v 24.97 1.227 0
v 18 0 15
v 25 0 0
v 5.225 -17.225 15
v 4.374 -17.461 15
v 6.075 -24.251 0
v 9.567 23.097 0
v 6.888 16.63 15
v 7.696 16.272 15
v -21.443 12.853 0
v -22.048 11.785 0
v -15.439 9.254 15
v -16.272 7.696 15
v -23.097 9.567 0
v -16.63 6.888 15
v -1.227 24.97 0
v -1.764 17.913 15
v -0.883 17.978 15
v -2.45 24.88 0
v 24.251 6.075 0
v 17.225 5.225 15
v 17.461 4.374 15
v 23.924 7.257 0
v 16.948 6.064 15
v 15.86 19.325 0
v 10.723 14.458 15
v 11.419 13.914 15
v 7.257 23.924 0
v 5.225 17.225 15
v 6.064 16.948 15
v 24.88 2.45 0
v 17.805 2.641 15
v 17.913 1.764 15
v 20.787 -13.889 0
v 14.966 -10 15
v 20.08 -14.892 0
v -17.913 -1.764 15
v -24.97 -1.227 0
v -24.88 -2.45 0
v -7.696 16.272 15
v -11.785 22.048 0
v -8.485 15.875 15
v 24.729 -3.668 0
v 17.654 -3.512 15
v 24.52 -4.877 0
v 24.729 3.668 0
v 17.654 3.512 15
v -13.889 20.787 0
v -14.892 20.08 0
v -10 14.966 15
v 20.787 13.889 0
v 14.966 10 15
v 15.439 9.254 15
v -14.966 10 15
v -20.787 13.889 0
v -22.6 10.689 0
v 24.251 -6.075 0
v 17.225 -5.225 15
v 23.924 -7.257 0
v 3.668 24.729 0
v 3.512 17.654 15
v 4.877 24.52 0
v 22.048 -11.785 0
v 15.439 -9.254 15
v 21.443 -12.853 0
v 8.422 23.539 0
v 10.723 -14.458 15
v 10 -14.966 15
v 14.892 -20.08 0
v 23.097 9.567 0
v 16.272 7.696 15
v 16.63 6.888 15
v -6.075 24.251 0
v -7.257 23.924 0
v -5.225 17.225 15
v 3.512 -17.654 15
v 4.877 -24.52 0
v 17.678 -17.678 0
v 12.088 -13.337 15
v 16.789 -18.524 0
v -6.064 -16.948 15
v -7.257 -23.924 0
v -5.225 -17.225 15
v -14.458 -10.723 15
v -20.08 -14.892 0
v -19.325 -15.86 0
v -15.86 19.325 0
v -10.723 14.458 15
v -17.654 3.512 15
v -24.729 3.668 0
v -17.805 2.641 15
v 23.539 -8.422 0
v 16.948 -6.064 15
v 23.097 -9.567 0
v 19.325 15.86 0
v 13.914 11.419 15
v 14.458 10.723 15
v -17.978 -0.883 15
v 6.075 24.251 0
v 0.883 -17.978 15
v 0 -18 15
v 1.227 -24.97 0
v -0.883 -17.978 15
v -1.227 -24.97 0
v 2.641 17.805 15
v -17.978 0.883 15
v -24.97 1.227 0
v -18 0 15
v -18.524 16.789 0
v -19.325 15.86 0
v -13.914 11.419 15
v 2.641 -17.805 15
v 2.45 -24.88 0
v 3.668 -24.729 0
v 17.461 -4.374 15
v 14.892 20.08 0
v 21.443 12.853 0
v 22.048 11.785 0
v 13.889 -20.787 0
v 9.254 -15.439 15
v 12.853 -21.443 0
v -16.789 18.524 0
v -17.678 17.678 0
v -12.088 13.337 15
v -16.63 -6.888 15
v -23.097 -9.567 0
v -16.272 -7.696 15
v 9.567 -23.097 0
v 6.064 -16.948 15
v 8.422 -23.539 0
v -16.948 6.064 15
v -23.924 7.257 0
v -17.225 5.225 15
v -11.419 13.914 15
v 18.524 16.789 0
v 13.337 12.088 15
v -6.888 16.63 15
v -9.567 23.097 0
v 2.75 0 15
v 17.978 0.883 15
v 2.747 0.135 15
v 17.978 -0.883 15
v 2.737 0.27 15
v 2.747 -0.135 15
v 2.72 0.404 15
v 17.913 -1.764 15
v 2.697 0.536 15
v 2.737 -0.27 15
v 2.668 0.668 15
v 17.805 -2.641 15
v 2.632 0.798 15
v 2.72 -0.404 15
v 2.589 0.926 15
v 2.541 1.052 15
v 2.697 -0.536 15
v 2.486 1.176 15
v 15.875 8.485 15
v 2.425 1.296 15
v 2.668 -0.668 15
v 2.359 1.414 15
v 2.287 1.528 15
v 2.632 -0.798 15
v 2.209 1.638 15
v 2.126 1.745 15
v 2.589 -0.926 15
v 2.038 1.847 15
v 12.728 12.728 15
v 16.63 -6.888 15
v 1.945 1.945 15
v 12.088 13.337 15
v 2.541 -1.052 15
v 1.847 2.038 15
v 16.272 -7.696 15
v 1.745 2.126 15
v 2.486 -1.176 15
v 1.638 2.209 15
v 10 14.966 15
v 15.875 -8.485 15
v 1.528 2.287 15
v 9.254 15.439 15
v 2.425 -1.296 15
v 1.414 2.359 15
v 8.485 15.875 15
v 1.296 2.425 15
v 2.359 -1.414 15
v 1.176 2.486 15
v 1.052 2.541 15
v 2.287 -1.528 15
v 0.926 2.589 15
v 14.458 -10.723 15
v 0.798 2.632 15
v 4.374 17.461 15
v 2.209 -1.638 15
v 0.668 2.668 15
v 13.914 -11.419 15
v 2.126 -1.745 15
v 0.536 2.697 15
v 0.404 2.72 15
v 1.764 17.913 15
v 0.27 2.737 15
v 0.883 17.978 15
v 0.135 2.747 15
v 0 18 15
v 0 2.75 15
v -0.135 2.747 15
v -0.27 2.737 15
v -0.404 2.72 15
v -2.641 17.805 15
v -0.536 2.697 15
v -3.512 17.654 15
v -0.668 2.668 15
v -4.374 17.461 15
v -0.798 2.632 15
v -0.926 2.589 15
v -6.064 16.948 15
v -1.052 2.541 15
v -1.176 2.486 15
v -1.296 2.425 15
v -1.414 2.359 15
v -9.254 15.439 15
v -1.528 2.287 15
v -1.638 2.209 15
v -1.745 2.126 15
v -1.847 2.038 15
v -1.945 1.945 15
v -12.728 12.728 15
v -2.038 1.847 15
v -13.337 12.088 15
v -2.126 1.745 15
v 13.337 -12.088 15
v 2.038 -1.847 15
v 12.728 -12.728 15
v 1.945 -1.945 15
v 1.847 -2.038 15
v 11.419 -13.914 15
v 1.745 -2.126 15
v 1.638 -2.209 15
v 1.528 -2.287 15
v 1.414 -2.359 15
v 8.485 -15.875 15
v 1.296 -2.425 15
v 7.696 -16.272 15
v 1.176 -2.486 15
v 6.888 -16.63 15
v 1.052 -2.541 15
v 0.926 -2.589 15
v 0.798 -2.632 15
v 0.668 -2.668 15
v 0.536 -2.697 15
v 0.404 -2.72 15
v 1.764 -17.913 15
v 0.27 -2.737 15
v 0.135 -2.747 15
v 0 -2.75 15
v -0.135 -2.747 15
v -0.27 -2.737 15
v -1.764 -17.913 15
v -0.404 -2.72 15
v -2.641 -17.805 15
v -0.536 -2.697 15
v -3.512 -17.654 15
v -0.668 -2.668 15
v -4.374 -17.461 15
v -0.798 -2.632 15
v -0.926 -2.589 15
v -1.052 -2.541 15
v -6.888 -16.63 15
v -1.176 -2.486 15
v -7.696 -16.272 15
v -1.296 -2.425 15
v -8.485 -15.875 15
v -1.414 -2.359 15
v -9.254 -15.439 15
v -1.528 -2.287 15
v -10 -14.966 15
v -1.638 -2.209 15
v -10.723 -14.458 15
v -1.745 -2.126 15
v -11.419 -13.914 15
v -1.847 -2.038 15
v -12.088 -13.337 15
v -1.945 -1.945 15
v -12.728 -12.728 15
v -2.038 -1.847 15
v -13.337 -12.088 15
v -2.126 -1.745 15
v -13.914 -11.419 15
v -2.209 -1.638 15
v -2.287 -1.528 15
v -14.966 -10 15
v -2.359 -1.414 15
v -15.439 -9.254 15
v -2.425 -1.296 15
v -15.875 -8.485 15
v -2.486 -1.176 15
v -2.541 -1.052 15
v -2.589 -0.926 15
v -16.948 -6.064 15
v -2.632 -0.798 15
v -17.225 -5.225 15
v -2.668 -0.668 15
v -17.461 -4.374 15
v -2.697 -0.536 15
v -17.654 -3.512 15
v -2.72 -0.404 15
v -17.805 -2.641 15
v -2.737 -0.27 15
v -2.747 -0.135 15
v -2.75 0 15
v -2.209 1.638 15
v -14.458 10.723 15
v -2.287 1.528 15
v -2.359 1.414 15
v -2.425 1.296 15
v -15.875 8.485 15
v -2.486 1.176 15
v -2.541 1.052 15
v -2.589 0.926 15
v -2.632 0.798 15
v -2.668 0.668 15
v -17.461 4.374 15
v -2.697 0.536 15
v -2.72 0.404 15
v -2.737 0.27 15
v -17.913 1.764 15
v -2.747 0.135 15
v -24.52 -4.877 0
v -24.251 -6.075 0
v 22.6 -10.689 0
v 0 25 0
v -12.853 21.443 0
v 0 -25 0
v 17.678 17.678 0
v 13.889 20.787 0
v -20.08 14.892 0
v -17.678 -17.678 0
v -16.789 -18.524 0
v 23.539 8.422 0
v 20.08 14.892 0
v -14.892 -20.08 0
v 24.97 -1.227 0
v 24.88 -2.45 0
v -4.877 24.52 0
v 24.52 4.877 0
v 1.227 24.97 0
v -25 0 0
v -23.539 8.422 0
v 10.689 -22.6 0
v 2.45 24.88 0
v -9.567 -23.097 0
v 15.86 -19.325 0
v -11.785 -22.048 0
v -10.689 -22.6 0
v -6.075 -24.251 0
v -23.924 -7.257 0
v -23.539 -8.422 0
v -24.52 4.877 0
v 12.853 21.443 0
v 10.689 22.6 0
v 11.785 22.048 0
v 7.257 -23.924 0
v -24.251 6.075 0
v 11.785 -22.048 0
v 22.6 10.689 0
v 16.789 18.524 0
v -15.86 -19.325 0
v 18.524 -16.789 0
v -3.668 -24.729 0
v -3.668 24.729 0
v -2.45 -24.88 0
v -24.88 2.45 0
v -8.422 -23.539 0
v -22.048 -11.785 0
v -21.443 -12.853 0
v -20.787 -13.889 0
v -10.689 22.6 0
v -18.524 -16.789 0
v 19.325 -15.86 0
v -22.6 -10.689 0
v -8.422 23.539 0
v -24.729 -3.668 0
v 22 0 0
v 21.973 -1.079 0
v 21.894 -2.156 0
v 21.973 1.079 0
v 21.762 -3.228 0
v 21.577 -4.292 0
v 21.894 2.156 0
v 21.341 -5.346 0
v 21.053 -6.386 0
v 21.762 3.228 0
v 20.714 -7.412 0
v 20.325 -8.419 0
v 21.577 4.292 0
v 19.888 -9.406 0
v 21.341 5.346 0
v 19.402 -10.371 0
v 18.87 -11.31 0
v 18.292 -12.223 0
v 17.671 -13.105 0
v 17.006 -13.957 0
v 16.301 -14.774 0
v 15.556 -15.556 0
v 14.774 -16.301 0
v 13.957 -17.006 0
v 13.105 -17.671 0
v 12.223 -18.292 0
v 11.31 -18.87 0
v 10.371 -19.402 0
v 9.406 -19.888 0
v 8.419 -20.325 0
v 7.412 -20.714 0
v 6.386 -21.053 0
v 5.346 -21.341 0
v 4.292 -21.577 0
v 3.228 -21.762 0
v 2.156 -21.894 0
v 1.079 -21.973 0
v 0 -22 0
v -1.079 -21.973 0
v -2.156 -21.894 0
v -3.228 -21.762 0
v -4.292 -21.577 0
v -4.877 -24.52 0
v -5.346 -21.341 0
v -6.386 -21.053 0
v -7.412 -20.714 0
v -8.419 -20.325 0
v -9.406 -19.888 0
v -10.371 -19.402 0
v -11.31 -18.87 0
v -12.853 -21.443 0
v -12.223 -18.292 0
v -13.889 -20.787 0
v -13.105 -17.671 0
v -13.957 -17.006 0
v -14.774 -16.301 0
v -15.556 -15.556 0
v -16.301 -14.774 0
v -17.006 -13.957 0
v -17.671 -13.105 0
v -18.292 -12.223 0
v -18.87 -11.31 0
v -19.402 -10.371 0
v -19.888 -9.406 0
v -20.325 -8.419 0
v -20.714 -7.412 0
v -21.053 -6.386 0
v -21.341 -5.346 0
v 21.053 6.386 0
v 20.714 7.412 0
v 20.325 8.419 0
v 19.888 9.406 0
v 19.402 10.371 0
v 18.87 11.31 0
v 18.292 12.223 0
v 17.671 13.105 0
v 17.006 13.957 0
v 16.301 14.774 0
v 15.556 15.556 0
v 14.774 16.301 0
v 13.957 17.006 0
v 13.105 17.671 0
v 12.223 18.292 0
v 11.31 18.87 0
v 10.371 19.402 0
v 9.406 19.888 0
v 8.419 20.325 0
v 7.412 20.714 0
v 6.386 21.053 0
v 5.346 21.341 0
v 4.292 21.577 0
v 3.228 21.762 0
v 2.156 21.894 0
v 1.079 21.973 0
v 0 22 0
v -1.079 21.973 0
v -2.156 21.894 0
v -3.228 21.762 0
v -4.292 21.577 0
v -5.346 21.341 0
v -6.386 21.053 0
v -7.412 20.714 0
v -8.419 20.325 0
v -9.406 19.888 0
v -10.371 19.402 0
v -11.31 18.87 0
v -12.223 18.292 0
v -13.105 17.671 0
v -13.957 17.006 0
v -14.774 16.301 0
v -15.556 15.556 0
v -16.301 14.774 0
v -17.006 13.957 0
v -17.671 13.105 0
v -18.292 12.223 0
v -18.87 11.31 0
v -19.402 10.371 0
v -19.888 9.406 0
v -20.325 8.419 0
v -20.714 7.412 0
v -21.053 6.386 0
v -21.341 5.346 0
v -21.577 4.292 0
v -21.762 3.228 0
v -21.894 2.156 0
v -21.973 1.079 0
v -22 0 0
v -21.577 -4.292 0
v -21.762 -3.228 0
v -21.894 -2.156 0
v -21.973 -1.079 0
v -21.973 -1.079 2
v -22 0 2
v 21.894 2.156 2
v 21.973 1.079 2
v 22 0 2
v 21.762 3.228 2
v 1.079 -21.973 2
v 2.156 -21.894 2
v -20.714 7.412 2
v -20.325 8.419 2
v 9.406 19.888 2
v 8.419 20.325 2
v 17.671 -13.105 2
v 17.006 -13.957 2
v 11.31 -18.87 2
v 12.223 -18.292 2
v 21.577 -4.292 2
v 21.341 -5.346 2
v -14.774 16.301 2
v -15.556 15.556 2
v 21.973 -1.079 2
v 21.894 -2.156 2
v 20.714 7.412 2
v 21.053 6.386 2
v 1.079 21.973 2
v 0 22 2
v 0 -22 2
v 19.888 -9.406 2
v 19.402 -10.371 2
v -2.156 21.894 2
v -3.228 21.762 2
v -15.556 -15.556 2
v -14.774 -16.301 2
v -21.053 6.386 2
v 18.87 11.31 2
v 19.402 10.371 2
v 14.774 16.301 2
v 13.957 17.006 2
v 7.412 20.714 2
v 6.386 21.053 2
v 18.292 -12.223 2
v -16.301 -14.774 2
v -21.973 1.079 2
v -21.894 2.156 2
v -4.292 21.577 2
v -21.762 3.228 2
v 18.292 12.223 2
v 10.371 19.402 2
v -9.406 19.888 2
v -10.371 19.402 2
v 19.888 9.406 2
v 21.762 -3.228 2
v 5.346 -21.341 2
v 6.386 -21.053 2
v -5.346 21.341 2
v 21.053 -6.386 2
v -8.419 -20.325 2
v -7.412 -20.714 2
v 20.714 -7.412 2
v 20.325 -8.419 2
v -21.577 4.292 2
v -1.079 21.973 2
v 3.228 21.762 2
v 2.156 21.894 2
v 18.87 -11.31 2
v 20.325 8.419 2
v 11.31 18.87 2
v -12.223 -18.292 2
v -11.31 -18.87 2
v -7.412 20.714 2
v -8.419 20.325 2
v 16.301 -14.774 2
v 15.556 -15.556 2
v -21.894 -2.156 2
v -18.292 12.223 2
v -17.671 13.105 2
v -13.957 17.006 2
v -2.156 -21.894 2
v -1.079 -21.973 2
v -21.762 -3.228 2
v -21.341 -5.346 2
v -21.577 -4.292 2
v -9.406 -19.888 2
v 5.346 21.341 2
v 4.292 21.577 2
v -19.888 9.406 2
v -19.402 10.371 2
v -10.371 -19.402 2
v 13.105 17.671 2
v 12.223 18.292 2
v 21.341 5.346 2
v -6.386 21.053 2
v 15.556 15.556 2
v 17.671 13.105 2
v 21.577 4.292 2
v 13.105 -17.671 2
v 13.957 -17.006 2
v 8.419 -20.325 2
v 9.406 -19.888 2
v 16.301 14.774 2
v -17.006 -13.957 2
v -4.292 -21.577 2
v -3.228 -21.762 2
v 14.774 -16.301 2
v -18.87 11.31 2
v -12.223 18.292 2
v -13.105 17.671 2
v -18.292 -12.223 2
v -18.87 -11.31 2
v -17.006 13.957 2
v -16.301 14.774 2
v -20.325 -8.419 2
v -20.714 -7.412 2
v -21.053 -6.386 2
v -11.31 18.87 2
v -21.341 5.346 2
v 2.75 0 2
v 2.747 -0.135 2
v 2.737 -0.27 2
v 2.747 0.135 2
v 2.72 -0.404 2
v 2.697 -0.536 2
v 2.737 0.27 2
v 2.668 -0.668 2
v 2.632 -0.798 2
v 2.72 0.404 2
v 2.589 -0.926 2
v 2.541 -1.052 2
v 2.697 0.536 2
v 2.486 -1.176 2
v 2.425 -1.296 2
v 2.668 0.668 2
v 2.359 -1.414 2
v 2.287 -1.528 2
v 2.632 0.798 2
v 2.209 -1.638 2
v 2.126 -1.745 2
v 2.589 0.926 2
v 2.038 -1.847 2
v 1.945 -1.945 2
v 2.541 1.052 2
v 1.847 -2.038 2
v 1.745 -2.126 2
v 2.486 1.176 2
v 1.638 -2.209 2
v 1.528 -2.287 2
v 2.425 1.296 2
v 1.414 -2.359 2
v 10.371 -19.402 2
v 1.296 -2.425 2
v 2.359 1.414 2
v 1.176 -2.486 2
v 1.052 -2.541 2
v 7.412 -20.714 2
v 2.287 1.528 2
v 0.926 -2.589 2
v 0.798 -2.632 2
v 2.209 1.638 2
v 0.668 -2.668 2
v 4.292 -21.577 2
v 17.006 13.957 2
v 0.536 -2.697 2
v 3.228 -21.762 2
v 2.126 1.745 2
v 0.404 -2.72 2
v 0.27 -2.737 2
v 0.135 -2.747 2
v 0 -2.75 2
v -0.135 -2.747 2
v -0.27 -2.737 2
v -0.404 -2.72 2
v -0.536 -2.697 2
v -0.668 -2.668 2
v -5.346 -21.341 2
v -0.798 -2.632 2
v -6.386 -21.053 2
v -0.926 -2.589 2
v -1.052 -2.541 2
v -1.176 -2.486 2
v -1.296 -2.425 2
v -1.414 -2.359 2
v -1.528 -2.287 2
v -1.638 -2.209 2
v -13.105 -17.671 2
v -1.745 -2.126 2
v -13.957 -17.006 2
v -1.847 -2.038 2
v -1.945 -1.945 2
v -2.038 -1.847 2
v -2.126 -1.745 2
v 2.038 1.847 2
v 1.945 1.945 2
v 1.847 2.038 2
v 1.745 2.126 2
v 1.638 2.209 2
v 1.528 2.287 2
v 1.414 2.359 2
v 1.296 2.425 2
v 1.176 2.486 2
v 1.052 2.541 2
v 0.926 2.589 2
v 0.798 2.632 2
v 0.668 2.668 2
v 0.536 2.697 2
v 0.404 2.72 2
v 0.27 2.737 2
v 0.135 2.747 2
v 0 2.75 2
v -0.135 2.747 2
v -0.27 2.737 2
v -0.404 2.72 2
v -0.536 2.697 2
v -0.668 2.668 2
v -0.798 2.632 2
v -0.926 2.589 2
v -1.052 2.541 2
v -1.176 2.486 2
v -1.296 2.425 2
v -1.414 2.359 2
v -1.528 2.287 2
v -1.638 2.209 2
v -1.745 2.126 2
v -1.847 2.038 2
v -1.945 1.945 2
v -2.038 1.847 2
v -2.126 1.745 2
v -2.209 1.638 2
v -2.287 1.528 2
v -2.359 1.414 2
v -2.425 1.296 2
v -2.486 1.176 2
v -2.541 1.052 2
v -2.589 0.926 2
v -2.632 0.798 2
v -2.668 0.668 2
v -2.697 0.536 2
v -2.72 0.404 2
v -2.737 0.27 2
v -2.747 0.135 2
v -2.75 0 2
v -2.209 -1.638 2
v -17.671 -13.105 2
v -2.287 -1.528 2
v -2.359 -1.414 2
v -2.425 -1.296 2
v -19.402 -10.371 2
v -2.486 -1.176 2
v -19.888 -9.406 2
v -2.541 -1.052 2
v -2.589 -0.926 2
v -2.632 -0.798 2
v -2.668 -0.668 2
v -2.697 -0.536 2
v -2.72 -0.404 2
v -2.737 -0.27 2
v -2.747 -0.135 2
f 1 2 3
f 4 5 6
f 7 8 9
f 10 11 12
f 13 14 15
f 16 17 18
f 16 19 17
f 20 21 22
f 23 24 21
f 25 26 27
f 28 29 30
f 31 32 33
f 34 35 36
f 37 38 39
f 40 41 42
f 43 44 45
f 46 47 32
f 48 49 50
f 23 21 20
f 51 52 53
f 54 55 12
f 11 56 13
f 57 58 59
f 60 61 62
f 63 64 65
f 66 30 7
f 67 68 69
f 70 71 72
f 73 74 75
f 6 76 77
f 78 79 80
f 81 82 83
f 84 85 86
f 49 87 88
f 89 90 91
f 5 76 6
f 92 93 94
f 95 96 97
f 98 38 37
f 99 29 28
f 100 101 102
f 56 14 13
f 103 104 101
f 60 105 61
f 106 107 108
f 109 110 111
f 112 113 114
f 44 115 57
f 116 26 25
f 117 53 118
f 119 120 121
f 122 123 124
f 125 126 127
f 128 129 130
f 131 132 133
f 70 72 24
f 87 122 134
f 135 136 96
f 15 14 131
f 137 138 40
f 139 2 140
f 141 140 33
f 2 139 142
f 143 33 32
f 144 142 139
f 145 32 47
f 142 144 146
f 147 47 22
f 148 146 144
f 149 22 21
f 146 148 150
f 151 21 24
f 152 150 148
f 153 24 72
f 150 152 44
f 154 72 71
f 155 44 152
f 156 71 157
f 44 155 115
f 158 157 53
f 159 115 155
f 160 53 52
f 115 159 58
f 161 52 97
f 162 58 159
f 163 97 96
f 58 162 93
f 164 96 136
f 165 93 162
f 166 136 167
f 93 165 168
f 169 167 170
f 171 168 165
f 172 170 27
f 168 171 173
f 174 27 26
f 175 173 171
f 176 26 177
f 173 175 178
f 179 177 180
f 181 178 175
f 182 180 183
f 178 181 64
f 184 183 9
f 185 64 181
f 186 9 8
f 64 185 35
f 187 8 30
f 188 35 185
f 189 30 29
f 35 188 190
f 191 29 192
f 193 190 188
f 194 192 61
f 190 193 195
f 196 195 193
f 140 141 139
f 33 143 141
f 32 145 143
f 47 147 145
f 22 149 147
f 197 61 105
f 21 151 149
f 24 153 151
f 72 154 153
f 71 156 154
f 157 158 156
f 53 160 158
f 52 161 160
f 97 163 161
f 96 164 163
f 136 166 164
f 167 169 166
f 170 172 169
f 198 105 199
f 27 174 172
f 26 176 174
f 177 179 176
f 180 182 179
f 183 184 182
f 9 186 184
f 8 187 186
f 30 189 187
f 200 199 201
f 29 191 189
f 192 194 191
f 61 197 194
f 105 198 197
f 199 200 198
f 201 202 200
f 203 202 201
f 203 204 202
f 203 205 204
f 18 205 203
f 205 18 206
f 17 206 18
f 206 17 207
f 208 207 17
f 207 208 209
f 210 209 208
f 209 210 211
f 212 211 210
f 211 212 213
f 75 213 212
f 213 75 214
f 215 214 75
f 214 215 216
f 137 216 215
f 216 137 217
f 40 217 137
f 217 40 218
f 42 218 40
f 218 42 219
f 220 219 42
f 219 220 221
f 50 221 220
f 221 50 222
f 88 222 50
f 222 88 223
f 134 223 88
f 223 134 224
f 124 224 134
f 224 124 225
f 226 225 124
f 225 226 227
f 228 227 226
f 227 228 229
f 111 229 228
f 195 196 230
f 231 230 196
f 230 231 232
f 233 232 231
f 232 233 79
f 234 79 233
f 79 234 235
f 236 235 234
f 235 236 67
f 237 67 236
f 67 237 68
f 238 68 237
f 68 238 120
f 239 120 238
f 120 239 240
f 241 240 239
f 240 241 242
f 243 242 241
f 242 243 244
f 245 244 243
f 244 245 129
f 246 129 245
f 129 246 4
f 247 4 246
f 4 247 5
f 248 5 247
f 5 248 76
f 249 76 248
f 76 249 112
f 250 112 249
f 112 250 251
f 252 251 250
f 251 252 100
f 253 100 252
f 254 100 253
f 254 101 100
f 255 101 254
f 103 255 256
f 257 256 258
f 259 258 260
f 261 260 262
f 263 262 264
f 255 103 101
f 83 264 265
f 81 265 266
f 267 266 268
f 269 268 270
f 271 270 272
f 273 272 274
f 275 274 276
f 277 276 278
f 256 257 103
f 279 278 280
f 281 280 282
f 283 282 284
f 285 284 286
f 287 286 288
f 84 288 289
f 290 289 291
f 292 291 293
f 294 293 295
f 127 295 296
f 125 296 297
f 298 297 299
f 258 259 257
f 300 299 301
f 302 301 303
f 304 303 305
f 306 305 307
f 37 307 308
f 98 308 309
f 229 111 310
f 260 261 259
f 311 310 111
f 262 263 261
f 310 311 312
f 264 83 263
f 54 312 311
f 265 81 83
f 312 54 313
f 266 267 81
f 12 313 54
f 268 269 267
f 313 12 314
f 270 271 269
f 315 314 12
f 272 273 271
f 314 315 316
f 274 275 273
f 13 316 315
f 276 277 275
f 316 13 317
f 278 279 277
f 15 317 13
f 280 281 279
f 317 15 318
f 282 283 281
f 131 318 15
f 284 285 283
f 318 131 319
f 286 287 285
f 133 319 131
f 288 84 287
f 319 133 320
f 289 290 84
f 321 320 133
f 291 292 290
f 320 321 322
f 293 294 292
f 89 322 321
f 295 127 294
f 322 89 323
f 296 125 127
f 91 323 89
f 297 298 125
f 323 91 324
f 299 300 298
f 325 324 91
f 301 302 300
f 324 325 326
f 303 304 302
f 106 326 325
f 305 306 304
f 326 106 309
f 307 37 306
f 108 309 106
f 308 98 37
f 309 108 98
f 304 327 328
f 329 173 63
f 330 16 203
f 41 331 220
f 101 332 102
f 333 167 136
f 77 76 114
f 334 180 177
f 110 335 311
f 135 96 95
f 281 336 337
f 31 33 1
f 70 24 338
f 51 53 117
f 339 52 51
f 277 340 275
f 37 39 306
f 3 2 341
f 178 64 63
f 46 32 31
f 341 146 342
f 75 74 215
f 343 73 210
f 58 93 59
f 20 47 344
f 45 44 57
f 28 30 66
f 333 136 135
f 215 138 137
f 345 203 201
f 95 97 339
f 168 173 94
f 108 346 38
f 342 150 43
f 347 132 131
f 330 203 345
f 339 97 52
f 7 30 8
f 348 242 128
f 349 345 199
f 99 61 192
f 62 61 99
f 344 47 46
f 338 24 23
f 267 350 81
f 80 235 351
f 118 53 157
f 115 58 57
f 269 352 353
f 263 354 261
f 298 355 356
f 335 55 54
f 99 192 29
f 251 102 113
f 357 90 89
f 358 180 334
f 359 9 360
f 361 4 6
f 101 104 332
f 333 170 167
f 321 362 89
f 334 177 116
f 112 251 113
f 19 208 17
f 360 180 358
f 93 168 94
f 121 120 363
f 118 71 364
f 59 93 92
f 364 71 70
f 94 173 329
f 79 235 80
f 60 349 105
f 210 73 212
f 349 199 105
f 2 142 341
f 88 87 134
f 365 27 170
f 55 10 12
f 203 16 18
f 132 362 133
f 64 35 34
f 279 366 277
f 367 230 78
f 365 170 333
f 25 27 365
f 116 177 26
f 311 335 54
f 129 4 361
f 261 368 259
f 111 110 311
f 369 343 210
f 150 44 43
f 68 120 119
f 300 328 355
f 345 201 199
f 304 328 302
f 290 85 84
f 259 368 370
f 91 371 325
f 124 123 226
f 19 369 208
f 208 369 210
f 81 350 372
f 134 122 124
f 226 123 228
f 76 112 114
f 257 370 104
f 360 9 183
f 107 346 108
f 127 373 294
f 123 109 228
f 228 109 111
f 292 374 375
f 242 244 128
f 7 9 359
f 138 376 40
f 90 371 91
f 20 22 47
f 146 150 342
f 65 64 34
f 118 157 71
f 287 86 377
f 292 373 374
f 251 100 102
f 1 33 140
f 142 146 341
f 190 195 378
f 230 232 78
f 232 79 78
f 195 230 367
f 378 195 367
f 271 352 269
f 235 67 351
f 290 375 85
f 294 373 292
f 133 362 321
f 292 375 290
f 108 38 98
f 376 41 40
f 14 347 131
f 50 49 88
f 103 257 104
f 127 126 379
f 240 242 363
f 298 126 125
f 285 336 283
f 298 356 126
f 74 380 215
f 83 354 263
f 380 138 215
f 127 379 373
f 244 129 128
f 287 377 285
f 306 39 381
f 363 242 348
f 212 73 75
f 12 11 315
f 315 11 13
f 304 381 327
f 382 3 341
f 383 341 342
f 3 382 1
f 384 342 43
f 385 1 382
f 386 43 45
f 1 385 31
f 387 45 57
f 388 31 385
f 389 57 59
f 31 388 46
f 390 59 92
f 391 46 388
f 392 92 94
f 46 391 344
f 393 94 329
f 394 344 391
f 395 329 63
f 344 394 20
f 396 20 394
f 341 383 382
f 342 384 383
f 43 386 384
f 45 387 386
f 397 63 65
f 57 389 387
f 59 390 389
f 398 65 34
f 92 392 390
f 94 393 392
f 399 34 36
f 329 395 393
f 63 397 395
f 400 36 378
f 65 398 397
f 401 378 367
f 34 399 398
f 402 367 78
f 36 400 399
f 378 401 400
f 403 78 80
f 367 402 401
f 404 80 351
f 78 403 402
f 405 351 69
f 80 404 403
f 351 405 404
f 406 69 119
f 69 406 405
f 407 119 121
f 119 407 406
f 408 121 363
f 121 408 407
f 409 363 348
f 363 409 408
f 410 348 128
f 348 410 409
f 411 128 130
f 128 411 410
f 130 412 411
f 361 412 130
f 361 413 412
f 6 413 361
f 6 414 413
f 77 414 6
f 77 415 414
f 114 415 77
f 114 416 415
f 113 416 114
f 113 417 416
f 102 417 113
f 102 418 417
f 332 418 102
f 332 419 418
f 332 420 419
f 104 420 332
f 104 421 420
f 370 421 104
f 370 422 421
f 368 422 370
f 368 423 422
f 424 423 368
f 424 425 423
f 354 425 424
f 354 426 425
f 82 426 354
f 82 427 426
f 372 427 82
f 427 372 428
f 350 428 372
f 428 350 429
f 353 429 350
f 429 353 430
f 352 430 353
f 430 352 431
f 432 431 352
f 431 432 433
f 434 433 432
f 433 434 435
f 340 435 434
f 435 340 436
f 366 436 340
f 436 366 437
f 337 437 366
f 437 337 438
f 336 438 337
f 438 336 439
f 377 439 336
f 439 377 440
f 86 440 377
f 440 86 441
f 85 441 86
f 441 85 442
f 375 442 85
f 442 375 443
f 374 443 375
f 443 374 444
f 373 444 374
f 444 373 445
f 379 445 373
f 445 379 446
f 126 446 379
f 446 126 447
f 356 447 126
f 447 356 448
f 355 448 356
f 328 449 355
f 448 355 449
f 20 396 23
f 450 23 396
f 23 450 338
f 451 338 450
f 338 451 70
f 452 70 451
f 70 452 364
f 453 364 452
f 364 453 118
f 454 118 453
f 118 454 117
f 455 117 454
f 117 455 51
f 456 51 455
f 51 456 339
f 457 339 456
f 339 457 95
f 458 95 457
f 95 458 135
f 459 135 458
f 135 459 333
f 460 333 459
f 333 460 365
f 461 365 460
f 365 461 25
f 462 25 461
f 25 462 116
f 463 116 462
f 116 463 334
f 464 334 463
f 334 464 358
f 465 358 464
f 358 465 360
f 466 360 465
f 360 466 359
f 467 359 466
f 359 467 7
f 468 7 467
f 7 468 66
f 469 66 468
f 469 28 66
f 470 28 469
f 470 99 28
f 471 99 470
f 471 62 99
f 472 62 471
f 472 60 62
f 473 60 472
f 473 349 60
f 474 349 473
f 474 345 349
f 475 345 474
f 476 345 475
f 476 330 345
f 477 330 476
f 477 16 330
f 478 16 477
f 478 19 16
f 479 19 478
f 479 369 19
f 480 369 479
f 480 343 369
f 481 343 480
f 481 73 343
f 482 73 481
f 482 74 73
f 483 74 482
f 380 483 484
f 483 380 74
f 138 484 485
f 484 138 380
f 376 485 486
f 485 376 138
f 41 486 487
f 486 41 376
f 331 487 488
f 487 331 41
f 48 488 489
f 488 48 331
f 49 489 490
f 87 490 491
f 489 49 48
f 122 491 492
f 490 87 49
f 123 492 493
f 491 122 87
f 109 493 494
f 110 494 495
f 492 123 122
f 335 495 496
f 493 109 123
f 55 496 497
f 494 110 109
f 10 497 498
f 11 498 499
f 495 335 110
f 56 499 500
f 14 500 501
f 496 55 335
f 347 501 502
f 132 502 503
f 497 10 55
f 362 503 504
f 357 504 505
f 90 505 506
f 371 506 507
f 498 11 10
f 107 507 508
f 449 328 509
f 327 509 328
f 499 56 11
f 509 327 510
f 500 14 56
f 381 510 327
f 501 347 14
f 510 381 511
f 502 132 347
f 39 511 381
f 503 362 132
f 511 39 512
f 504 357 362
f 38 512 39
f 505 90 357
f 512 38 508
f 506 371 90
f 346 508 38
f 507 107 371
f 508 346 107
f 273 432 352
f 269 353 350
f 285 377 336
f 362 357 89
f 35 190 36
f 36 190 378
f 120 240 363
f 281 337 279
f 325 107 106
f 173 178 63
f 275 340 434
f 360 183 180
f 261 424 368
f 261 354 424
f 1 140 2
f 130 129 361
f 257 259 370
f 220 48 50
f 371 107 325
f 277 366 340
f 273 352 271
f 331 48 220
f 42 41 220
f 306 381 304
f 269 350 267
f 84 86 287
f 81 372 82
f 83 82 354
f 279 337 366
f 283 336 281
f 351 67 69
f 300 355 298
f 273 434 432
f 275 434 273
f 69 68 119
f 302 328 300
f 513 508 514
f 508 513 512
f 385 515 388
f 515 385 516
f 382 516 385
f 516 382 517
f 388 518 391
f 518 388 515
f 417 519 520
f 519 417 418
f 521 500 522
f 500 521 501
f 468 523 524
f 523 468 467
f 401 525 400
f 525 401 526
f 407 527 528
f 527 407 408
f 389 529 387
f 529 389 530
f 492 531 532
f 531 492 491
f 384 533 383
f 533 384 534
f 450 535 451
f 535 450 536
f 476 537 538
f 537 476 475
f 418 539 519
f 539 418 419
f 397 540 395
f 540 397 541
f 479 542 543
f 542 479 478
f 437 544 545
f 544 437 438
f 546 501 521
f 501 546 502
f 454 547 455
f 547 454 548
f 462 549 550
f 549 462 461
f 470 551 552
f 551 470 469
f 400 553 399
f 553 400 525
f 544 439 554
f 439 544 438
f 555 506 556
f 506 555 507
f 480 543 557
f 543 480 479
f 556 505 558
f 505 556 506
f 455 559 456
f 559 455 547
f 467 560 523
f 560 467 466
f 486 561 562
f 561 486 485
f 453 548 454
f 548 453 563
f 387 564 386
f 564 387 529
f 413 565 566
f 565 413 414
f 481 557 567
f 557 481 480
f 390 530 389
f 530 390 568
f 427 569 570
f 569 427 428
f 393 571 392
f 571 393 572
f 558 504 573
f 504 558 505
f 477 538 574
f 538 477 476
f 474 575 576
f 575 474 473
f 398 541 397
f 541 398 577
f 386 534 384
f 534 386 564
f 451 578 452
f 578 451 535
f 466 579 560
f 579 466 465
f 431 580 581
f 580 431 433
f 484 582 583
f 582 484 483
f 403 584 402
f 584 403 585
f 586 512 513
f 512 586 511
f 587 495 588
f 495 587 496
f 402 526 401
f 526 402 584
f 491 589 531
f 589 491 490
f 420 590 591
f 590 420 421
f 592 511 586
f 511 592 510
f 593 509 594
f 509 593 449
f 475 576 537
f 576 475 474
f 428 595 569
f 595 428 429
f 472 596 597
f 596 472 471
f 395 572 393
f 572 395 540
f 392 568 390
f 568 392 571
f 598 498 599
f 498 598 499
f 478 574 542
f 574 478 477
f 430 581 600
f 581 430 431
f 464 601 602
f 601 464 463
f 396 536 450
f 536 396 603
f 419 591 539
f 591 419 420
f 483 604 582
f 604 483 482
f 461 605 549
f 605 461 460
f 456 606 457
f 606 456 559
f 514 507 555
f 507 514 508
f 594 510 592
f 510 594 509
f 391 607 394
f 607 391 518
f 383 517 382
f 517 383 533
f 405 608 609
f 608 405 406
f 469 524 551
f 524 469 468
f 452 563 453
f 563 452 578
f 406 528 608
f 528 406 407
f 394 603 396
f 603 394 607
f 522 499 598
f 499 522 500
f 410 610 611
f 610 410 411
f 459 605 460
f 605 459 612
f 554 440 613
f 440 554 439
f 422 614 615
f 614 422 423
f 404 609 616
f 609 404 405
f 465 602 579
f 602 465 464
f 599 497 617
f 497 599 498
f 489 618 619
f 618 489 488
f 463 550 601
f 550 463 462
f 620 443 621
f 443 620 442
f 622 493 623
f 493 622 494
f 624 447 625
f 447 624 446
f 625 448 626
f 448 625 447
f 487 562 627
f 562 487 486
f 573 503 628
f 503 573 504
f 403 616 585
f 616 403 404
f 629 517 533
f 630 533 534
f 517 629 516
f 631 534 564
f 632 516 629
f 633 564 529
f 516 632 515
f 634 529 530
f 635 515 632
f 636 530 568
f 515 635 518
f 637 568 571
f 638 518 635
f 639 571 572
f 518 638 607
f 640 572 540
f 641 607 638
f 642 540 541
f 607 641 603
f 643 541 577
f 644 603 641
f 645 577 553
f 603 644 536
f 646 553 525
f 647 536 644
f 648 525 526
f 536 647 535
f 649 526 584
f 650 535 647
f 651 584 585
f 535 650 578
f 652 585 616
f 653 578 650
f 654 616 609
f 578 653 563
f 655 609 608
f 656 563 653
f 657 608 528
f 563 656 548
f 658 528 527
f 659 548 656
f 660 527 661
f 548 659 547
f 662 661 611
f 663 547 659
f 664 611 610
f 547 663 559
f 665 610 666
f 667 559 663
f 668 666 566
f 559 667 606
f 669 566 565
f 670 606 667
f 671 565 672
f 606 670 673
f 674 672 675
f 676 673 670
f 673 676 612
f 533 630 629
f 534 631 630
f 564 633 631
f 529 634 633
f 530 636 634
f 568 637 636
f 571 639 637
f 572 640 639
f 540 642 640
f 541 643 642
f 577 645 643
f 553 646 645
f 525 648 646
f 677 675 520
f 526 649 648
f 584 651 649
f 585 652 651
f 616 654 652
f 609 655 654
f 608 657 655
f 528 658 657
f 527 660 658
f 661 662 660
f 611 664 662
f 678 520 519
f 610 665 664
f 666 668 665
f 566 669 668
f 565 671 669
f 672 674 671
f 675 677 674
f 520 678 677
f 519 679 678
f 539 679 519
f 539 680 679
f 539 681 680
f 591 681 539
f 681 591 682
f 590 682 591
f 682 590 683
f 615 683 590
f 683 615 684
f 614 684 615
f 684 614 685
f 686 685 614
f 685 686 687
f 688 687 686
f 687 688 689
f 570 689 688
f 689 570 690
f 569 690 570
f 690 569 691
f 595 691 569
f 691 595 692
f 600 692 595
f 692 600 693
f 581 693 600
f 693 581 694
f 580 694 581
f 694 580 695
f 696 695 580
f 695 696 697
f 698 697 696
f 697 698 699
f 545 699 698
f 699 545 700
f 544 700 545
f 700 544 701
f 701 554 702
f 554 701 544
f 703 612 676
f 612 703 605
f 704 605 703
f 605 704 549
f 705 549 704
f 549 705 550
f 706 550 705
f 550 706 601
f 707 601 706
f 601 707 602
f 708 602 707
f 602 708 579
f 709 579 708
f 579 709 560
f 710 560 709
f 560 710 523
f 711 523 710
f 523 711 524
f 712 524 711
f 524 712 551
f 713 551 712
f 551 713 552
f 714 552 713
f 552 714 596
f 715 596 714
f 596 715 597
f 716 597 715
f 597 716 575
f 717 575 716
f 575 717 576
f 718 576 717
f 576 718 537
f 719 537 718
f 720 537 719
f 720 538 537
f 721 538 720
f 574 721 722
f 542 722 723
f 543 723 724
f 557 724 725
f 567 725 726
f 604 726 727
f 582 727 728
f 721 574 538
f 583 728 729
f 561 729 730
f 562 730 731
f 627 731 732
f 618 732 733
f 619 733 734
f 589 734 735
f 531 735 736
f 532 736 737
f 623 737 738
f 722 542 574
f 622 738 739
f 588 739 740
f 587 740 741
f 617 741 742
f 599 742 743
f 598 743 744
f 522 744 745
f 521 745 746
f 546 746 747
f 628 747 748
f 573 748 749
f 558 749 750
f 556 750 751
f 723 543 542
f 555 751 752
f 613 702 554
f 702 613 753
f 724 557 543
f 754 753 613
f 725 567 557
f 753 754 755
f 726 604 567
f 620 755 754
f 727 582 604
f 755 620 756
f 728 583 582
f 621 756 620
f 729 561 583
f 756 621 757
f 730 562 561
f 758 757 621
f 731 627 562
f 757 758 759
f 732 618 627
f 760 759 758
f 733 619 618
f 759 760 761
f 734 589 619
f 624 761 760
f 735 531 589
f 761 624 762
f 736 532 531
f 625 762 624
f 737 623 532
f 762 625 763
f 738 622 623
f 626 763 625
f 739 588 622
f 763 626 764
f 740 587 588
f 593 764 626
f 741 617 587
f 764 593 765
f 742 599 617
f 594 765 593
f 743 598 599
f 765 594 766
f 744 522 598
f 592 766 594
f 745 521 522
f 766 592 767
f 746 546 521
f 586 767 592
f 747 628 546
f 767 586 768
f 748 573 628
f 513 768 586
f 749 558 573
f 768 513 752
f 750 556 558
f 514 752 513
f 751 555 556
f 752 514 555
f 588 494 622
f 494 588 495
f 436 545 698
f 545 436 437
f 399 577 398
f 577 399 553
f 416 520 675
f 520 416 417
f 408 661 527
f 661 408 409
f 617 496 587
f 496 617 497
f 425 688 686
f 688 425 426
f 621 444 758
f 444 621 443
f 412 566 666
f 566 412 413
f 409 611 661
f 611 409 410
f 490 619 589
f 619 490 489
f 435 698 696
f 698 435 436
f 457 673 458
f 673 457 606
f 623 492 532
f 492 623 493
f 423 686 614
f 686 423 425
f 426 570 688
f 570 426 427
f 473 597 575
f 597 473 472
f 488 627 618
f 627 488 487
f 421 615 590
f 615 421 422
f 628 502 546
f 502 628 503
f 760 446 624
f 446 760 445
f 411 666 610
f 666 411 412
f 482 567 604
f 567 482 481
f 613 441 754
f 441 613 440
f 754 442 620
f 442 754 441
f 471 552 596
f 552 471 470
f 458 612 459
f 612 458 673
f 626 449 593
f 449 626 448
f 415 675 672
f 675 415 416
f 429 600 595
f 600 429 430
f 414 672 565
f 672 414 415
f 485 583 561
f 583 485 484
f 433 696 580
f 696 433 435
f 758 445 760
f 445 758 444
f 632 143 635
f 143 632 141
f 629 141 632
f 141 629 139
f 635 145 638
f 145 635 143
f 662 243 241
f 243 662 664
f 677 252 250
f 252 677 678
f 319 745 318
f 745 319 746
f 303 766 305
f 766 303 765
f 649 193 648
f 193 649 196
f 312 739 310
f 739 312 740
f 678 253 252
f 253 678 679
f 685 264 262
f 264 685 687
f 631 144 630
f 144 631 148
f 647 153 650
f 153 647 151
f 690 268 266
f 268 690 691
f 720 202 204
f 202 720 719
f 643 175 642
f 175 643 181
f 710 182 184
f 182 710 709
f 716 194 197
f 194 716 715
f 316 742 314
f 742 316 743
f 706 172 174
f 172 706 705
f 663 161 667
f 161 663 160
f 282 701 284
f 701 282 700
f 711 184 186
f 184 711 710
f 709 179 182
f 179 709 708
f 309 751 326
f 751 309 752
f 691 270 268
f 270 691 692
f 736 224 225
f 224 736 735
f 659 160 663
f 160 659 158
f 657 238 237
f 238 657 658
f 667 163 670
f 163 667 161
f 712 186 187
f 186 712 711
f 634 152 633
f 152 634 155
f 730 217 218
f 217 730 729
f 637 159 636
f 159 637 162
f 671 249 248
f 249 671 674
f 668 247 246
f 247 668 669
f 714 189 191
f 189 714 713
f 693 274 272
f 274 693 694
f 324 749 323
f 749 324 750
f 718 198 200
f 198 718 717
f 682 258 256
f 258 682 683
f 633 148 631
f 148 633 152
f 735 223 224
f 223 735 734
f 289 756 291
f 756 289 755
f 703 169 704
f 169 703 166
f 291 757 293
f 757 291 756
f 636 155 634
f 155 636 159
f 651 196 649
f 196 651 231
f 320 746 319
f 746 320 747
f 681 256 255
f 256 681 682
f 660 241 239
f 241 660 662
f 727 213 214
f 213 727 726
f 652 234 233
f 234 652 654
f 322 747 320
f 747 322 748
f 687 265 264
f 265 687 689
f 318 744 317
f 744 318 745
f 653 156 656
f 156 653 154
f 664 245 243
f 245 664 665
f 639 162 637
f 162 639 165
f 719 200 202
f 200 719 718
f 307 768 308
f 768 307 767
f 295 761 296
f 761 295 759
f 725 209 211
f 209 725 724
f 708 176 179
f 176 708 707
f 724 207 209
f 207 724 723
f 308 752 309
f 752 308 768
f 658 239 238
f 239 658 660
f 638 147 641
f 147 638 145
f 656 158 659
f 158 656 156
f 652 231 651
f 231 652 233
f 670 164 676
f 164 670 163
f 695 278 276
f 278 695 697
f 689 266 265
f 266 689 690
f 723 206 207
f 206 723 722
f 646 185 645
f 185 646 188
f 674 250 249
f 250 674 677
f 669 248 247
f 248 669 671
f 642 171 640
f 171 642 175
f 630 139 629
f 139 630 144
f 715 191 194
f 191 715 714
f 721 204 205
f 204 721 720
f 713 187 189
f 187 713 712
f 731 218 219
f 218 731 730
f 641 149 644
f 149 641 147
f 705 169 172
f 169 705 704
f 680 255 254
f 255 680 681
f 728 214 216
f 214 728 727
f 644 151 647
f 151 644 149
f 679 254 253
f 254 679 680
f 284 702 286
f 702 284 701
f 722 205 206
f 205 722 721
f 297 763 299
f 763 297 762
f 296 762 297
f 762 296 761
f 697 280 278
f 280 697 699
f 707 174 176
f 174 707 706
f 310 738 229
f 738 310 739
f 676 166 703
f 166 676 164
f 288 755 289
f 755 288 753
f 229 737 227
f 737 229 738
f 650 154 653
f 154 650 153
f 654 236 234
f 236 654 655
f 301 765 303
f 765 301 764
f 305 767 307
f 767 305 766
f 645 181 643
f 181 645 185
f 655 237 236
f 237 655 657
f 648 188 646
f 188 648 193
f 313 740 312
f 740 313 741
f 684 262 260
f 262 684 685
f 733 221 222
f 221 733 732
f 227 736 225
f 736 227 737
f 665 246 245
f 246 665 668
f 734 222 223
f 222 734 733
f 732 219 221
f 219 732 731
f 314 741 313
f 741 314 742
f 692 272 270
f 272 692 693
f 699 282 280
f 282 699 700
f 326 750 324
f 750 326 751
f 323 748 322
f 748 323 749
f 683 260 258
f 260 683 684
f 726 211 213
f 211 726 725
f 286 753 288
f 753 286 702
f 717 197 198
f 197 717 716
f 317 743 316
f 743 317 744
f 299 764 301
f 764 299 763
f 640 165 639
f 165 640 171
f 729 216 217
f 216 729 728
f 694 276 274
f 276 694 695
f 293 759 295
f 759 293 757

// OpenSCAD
// Anti-vibration foot for benchtop instrument
// Print orientation: wide base on bed (z = 0), narrowing upward

// ---- Parameters (mm) ----
base_d      = 50;    // frustum diameter at bottom (z = 0)
top_d       = 36;    // frustum diameter at flat top
height      = 15;    // overall height
recess_d    = 44;    // rubber pad recess diameter (bottom face)
recess_h    = 2;     // rubber pad recess depth
screw_d     = 5.5;   // central screw through-hole diameter
eps         = 0.5;   // cutter overlap past faces

$fn = 128;

difference() {
    // Main frustum body
    cylinder(h = height, d1 = base_d, d2 = top_d);

    // Rubber pad recess in bottom face
    translate([0, 0, -eps])
        cylinder(h = recess_h + eps, d = recess_d);

    // Central screw through-hole
    translate([0, 0, -eps])
        cylinder(h = height + 2 * eps, d = screw_d);
}
